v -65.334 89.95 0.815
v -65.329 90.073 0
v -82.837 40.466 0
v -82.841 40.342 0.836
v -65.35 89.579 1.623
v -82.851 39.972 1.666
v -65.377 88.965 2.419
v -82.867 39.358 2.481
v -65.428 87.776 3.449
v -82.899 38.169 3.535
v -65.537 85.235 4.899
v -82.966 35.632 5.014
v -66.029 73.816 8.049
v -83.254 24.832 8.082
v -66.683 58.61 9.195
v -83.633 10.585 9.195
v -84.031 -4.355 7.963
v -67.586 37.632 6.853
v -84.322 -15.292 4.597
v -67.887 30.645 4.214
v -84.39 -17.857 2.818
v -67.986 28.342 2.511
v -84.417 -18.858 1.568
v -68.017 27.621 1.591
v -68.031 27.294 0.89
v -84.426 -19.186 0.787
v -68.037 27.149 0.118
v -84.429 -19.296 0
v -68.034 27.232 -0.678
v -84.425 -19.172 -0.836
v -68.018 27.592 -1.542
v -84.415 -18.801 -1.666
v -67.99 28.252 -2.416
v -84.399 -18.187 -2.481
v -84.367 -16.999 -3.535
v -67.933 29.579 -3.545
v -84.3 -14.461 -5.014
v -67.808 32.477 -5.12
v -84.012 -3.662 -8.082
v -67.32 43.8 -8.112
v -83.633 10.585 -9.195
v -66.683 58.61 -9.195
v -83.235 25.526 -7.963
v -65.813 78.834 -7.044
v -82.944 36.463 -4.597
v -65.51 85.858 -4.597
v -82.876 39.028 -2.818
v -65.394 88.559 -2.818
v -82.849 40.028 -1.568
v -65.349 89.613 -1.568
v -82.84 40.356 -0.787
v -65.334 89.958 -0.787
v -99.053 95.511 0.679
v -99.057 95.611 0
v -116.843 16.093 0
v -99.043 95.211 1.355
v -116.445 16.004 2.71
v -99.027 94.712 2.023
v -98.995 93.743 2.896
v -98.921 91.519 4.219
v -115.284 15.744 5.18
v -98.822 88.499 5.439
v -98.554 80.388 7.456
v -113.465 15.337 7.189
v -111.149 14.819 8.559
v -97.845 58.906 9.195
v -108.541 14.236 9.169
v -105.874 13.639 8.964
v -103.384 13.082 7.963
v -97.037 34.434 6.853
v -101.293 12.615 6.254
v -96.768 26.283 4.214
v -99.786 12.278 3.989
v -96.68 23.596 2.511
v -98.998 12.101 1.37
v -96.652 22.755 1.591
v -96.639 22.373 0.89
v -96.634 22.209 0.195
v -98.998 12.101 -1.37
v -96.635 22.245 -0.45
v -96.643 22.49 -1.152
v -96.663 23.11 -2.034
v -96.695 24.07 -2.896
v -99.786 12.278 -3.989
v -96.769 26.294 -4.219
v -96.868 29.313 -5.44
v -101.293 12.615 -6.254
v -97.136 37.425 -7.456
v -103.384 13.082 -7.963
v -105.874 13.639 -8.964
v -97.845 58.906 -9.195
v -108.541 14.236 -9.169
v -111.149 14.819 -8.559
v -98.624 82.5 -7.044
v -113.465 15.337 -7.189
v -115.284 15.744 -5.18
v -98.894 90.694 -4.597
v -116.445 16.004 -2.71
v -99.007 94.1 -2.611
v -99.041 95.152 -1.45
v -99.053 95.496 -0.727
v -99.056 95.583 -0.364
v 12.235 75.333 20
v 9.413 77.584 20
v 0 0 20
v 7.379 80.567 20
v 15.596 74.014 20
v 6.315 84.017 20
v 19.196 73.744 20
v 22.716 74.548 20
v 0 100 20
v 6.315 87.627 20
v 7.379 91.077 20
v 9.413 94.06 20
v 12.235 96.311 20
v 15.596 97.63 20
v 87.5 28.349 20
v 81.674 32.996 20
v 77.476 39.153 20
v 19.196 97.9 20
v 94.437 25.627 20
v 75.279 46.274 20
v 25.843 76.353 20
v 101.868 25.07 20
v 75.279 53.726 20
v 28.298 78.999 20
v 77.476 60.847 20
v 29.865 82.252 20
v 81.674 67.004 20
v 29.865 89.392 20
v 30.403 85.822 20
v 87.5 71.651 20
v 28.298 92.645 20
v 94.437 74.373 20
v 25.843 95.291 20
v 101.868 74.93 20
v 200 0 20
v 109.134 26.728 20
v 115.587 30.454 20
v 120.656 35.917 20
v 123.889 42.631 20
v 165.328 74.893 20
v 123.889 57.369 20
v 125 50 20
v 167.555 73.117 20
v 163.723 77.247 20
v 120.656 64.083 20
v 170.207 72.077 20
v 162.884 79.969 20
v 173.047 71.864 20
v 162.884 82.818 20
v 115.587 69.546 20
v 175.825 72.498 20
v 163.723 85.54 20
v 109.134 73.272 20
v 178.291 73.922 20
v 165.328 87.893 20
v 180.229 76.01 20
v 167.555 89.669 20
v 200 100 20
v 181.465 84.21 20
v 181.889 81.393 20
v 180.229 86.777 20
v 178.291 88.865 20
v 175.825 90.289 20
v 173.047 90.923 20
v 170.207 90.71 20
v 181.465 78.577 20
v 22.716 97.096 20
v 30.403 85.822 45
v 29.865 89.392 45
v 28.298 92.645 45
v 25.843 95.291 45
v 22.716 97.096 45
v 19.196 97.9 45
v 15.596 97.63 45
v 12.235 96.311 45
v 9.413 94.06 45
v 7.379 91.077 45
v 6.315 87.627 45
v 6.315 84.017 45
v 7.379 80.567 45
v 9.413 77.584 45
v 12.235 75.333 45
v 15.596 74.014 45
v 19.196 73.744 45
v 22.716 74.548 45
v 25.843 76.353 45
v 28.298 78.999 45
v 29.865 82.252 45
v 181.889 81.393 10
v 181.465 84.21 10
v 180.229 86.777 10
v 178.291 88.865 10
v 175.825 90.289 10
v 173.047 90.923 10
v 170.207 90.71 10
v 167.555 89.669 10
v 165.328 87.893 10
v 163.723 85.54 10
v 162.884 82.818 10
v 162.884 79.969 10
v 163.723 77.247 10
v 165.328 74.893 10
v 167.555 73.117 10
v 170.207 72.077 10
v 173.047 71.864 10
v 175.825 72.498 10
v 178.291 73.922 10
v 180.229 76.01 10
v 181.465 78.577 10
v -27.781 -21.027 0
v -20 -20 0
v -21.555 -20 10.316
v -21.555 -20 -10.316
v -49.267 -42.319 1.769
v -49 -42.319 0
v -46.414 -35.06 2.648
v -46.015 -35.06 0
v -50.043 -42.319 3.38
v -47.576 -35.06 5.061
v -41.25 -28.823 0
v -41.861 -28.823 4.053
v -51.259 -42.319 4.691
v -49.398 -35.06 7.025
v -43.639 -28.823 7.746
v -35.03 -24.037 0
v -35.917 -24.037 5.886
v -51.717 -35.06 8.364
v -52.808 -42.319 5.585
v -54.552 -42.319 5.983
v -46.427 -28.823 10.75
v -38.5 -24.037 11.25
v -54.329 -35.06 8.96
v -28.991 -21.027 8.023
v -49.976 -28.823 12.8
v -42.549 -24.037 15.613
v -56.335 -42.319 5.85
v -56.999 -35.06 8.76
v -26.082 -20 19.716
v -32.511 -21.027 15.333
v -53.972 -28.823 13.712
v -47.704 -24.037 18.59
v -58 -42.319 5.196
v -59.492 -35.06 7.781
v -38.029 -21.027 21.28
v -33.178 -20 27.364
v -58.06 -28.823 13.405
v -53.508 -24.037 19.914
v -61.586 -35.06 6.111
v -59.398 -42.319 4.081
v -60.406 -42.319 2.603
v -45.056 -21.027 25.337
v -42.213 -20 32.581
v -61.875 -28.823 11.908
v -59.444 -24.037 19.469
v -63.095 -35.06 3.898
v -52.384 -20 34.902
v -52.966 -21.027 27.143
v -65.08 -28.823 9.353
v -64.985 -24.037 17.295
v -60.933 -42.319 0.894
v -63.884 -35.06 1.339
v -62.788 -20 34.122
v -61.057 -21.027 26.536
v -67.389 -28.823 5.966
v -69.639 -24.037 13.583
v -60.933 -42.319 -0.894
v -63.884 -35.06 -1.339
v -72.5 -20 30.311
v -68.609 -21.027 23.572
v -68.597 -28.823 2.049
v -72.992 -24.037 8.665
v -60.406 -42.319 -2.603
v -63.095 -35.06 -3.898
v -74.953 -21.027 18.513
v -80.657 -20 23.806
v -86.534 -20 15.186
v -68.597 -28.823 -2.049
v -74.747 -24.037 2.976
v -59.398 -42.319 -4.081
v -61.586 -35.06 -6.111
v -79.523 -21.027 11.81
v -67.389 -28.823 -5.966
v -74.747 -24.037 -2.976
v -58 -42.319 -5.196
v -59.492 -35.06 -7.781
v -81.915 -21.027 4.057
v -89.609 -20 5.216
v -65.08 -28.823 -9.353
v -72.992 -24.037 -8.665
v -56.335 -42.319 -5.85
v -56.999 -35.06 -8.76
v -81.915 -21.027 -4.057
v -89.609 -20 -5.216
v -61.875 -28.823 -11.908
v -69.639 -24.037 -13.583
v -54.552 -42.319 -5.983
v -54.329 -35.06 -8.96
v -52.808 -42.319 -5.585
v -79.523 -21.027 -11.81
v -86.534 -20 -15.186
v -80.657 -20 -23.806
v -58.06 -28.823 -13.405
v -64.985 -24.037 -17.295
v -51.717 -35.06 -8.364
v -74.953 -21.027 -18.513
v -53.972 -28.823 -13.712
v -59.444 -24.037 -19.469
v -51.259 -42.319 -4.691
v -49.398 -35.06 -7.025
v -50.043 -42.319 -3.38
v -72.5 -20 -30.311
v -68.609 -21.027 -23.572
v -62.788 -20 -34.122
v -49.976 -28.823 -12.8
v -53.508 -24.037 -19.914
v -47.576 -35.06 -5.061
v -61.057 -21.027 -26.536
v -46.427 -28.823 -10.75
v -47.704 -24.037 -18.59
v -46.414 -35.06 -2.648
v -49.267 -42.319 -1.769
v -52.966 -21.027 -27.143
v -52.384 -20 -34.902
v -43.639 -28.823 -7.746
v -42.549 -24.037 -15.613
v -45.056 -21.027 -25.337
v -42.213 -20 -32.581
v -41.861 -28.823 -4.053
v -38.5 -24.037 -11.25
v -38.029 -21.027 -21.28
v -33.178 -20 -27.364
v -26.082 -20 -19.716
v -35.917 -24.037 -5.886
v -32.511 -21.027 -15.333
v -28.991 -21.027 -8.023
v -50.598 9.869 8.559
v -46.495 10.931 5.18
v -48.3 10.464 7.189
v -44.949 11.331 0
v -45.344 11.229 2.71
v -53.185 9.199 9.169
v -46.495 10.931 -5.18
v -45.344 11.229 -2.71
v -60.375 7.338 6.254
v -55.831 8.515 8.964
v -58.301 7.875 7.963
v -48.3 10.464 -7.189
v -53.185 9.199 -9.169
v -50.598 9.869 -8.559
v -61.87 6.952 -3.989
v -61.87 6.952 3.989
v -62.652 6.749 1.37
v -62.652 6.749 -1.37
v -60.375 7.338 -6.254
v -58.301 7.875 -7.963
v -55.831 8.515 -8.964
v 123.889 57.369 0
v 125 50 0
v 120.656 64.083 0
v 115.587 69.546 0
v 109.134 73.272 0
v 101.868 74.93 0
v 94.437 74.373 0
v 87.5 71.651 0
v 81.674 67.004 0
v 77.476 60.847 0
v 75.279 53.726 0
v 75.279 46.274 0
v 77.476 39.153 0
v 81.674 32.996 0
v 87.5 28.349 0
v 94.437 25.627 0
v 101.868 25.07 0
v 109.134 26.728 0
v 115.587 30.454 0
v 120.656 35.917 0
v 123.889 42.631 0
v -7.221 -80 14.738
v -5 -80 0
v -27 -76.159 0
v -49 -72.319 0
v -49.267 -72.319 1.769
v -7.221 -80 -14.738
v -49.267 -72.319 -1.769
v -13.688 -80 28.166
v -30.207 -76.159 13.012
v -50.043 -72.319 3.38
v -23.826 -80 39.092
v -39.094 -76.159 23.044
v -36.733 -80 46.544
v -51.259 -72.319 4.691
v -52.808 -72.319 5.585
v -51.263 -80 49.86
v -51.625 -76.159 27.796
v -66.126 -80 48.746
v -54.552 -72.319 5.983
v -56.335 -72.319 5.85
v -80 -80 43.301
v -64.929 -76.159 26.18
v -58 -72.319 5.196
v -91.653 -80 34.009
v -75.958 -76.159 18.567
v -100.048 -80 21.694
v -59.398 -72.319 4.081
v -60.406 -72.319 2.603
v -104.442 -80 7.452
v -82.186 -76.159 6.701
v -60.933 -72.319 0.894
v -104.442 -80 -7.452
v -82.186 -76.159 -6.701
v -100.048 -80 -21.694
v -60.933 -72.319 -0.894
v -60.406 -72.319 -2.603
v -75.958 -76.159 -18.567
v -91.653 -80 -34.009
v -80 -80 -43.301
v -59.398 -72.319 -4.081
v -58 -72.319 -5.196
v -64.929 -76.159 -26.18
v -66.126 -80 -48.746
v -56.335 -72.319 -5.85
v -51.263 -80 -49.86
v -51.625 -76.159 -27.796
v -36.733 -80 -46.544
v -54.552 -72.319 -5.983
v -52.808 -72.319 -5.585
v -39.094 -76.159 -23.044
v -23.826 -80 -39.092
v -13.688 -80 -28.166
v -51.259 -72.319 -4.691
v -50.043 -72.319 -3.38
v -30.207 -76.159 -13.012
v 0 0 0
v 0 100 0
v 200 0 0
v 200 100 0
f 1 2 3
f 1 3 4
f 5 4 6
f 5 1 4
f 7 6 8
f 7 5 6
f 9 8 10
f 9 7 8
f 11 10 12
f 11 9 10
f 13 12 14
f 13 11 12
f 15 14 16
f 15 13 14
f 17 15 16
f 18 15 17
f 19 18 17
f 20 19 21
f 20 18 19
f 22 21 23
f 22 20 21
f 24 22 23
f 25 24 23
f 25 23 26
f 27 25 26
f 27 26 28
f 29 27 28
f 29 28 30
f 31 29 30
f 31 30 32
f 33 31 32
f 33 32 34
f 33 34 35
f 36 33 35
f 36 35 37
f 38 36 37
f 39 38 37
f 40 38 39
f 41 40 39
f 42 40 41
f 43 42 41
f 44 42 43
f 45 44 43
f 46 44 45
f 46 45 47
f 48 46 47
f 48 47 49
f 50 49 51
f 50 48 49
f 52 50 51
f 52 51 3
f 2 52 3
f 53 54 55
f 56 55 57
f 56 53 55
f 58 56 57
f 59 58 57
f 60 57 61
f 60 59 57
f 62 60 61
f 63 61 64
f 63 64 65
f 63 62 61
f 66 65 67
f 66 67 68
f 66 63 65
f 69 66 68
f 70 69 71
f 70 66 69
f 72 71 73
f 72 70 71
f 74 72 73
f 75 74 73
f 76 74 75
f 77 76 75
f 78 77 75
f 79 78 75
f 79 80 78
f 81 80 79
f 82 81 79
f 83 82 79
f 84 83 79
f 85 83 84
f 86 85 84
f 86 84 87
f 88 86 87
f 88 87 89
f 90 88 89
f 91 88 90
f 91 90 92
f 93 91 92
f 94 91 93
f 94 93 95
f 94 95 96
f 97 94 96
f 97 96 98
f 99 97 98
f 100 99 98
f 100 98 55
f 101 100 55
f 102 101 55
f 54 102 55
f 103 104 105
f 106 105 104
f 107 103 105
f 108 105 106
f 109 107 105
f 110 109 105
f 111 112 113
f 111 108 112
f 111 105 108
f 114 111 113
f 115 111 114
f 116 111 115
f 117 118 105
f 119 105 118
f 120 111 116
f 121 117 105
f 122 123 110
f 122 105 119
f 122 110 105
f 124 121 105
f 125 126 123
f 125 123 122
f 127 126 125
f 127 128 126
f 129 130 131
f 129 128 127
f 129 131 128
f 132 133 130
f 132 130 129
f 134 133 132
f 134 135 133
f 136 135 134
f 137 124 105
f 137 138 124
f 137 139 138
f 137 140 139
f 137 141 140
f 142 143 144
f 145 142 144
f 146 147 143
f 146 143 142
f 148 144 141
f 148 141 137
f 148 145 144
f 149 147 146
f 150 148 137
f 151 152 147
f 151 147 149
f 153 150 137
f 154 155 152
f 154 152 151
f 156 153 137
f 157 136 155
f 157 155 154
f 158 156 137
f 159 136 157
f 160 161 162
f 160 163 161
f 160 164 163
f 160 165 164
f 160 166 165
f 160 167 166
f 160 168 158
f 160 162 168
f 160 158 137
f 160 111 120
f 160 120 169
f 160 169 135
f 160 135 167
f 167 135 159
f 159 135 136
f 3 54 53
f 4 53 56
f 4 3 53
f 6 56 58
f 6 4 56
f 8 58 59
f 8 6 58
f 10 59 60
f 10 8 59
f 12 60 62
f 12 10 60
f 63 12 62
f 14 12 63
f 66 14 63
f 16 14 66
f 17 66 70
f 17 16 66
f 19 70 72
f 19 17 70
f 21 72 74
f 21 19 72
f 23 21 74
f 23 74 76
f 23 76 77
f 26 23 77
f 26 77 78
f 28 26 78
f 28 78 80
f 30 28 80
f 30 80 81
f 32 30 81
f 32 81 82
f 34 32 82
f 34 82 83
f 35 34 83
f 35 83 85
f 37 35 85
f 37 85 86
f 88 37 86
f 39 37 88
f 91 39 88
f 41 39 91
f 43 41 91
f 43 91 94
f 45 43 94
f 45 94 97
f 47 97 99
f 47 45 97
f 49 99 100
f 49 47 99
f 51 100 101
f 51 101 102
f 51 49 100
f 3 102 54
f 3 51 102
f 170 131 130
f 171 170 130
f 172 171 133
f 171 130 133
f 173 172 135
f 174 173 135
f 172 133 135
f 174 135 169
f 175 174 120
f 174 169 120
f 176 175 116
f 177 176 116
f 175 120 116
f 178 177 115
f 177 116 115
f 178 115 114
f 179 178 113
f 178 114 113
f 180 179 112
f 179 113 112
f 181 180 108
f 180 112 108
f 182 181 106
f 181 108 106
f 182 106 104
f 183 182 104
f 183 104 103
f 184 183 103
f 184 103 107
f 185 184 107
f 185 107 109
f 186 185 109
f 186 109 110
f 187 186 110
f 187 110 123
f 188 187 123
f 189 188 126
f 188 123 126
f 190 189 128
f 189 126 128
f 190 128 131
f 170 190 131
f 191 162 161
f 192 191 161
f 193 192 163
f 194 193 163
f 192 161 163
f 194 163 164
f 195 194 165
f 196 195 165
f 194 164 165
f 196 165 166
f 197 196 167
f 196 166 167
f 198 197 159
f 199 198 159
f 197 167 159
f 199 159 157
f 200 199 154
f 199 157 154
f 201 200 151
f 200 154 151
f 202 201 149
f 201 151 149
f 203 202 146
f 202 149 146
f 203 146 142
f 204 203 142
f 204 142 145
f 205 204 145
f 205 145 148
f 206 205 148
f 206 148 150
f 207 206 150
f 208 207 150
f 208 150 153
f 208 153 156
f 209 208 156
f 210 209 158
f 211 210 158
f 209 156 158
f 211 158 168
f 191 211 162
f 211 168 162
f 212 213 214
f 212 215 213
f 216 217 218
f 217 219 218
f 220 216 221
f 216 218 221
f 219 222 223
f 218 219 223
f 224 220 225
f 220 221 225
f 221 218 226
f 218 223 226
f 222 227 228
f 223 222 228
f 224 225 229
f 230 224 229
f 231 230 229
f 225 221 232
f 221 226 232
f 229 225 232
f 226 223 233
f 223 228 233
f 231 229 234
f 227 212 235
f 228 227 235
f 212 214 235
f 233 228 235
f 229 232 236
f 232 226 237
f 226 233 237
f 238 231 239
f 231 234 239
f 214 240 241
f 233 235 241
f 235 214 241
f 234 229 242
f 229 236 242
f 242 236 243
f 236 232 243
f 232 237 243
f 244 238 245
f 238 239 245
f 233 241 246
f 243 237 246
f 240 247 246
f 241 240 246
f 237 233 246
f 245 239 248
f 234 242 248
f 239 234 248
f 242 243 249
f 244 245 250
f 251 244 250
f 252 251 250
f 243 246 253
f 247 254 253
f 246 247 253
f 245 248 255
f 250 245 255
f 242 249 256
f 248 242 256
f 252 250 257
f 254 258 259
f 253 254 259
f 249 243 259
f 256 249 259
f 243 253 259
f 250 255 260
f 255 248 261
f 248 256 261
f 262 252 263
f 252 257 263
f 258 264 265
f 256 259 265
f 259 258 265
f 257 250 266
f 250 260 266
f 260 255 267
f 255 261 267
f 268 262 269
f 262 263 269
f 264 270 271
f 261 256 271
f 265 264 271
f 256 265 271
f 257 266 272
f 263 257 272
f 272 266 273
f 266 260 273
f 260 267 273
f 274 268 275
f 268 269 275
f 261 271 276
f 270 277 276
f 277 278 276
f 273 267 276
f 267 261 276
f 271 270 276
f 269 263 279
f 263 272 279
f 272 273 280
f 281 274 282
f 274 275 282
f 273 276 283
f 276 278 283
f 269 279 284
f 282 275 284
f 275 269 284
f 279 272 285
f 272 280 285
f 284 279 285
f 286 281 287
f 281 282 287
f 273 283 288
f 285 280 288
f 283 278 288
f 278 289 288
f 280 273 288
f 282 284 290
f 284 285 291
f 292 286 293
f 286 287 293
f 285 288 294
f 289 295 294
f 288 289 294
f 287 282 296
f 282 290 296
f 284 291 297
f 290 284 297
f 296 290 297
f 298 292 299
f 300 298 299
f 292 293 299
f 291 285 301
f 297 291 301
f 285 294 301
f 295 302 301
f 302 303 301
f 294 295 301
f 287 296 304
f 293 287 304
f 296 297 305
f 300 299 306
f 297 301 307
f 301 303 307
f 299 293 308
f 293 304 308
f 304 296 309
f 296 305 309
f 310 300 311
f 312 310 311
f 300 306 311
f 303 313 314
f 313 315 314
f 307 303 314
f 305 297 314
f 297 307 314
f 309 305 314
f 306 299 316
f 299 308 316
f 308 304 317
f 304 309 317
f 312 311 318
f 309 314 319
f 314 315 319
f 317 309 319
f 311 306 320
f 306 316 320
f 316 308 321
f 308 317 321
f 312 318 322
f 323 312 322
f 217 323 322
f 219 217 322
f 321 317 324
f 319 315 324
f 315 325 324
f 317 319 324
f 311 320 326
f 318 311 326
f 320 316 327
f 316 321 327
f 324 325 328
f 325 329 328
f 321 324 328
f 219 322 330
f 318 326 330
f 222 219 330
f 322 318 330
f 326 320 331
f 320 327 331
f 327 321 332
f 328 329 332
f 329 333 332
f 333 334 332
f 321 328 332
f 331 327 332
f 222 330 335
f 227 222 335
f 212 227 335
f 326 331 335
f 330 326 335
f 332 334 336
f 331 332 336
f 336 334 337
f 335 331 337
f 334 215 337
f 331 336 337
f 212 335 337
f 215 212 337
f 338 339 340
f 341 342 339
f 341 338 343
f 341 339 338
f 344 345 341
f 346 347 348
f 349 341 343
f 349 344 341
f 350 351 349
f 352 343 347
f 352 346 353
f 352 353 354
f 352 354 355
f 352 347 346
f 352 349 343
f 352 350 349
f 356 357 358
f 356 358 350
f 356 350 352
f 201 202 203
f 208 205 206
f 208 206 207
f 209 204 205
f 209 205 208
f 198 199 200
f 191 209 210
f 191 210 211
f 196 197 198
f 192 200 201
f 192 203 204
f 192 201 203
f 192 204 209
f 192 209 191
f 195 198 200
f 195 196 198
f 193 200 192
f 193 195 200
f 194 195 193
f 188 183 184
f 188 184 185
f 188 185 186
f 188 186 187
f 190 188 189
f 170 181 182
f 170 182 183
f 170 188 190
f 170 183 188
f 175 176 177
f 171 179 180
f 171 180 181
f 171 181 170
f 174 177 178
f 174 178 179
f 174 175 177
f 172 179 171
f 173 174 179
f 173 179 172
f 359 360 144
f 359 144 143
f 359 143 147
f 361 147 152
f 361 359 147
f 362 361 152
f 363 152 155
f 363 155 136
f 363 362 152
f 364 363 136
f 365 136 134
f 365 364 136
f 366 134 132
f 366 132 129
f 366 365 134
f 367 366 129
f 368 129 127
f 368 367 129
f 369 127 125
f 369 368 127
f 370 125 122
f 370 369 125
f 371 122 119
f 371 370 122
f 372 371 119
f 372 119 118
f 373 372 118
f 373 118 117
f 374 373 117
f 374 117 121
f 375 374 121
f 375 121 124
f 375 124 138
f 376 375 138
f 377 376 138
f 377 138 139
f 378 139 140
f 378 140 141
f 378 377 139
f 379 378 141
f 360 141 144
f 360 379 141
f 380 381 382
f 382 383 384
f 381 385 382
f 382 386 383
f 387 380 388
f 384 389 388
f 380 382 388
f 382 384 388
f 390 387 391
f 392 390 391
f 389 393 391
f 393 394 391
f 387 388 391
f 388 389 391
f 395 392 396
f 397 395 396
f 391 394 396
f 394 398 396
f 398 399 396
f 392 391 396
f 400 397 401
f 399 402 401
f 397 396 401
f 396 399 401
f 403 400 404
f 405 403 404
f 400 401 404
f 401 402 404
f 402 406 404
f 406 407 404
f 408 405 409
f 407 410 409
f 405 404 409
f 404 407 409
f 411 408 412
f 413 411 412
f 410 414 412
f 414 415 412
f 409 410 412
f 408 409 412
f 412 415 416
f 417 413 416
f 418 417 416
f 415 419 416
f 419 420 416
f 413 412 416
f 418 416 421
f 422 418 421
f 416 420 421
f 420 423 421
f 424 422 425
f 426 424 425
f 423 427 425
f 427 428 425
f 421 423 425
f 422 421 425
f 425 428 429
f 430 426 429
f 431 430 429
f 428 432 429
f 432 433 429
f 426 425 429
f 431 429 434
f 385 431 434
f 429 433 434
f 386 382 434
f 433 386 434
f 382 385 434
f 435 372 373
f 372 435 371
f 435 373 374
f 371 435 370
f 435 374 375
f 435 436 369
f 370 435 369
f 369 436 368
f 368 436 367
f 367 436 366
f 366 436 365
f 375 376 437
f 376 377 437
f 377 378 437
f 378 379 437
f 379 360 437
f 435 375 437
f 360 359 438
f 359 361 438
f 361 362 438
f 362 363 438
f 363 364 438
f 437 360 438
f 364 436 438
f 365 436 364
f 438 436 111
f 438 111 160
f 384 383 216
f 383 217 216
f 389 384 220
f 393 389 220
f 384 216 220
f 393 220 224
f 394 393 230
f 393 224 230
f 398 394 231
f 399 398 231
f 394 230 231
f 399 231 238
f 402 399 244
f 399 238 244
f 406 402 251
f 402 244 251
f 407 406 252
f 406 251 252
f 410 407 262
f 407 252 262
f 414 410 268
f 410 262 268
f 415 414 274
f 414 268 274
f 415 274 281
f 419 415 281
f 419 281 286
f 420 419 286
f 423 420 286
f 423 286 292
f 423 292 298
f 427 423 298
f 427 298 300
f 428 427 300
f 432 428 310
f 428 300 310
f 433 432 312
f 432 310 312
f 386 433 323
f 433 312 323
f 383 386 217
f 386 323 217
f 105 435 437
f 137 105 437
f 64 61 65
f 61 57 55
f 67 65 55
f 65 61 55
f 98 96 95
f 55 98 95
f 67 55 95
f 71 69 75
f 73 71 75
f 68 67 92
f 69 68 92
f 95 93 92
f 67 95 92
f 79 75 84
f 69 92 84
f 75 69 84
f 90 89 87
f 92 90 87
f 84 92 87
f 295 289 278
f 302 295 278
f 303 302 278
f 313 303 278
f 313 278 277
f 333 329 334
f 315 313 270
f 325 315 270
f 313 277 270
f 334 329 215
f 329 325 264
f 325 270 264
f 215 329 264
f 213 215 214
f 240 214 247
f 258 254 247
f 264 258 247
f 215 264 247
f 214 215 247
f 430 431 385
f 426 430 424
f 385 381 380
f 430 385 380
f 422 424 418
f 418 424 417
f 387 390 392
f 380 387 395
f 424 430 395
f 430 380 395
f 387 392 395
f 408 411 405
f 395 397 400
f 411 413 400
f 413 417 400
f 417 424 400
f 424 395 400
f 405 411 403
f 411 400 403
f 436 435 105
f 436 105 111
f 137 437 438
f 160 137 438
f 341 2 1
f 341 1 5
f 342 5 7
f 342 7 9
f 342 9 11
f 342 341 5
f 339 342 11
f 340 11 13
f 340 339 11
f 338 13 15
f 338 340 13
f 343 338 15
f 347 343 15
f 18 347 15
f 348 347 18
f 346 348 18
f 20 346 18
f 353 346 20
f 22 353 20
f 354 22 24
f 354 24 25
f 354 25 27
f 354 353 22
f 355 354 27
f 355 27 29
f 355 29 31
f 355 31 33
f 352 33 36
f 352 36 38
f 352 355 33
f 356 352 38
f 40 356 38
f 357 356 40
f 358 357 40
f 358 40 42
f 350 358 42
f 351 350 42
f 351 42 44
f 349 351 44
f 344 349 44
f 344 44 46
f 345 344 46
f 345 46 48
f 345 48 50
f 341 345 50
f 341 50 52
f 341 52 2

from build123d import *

# Parameters (mm, degrees)
F0_W     = 200
F0_H     = 100
F0_R     = 25
F1_DEPTH = 20
F2_R     = 9.5562546225
F3_DEPTH = 10
F4_R     = 12.1114454646
F5_DEPTH = 25
F10_R    = 9.1946691557


with BuildPart() as f1:
    # F0 (on Top) → F1 (new body)
    with BuildSketch(Plane.XY):
        with Locations((100, 50)):
            Rectangle(F0_W, F0_H)
        with Locations((100, 50)):
            Circle(F0_R, mode=Mode.SUBTRACT)
    extrude(amount=F1_DEPTH)

    # F2 (on face) → F3 (cut)
    with BuildSketch(Plane.XY.offset(20)):
        with Locations((172.3332256079, 81.3933163881)):
            Circle(F2_R)
    extrude(amount=-F3_DEPTH, mode=Mode.SUBTRACT)

    # F4 (on face) → F5 (join)
    with BuildSketch(Plane.XY.offset(20)):
        with Locations((18.2912219316, 85.8220160007)):
            Circle(F4_R)
    extrude(amount=F5_DEPTH)


with BuildPart() as f7:
    # F6 (on Top) → F7 (revolve)
    with BuildSketch(Plane.XY):
        with BuildLine():
            ThreePointArc((-49, -42.3188542521), (-38.2970711804, -26.2257032445), (-20, -20))
            Line((-20, -20), (-55, -20))
            Line((-55, -20), (-55, -80))
            Line((-55, -80), (-5, -80))
            Line((-5, -80), (-49, -72.3188542521))
            Line((-49, -72.3188542521), (-49, -42.3188542521))
        make_face()
    revolve(axis=Axis((-55, -50, 0), (0, -1, 0)))


with BuildPart() as f11:
    # F11: sweep along a path in F8
    with BuildLine(Plane.XY) as f11_path:
        Line((-107.3636263609, 13.9726176858), (-97.7765619755, 56.8324439228))
        Line((-97.7765619755, 56.8324439228), (-83.6779251695, 8.8971117511))
        Line((-83.6779251695, 8.8971117511), (-66.7595788836, 56.8324439228))
        Line((-66.7595788836, 56.8324439228), (-54.352786392, 8.8971117511))
    # F10 (on line) → F11 (sweep)
    with BuildSketch(Plane(origin=(-2.139399341, -9.5643755294, 0), x_dir=(-0.9758839919, 0.2182897945, 0), z_dir=(0.2182897945, 0.9758839919, 0))):
        with Locations((108.3439812064, 0)):
            Circle(F10_R)
    sweep(path=f11_path.line, transition=Transition.RIGHT)


solid = Compound([f1.part, f7.part, f11.part])
